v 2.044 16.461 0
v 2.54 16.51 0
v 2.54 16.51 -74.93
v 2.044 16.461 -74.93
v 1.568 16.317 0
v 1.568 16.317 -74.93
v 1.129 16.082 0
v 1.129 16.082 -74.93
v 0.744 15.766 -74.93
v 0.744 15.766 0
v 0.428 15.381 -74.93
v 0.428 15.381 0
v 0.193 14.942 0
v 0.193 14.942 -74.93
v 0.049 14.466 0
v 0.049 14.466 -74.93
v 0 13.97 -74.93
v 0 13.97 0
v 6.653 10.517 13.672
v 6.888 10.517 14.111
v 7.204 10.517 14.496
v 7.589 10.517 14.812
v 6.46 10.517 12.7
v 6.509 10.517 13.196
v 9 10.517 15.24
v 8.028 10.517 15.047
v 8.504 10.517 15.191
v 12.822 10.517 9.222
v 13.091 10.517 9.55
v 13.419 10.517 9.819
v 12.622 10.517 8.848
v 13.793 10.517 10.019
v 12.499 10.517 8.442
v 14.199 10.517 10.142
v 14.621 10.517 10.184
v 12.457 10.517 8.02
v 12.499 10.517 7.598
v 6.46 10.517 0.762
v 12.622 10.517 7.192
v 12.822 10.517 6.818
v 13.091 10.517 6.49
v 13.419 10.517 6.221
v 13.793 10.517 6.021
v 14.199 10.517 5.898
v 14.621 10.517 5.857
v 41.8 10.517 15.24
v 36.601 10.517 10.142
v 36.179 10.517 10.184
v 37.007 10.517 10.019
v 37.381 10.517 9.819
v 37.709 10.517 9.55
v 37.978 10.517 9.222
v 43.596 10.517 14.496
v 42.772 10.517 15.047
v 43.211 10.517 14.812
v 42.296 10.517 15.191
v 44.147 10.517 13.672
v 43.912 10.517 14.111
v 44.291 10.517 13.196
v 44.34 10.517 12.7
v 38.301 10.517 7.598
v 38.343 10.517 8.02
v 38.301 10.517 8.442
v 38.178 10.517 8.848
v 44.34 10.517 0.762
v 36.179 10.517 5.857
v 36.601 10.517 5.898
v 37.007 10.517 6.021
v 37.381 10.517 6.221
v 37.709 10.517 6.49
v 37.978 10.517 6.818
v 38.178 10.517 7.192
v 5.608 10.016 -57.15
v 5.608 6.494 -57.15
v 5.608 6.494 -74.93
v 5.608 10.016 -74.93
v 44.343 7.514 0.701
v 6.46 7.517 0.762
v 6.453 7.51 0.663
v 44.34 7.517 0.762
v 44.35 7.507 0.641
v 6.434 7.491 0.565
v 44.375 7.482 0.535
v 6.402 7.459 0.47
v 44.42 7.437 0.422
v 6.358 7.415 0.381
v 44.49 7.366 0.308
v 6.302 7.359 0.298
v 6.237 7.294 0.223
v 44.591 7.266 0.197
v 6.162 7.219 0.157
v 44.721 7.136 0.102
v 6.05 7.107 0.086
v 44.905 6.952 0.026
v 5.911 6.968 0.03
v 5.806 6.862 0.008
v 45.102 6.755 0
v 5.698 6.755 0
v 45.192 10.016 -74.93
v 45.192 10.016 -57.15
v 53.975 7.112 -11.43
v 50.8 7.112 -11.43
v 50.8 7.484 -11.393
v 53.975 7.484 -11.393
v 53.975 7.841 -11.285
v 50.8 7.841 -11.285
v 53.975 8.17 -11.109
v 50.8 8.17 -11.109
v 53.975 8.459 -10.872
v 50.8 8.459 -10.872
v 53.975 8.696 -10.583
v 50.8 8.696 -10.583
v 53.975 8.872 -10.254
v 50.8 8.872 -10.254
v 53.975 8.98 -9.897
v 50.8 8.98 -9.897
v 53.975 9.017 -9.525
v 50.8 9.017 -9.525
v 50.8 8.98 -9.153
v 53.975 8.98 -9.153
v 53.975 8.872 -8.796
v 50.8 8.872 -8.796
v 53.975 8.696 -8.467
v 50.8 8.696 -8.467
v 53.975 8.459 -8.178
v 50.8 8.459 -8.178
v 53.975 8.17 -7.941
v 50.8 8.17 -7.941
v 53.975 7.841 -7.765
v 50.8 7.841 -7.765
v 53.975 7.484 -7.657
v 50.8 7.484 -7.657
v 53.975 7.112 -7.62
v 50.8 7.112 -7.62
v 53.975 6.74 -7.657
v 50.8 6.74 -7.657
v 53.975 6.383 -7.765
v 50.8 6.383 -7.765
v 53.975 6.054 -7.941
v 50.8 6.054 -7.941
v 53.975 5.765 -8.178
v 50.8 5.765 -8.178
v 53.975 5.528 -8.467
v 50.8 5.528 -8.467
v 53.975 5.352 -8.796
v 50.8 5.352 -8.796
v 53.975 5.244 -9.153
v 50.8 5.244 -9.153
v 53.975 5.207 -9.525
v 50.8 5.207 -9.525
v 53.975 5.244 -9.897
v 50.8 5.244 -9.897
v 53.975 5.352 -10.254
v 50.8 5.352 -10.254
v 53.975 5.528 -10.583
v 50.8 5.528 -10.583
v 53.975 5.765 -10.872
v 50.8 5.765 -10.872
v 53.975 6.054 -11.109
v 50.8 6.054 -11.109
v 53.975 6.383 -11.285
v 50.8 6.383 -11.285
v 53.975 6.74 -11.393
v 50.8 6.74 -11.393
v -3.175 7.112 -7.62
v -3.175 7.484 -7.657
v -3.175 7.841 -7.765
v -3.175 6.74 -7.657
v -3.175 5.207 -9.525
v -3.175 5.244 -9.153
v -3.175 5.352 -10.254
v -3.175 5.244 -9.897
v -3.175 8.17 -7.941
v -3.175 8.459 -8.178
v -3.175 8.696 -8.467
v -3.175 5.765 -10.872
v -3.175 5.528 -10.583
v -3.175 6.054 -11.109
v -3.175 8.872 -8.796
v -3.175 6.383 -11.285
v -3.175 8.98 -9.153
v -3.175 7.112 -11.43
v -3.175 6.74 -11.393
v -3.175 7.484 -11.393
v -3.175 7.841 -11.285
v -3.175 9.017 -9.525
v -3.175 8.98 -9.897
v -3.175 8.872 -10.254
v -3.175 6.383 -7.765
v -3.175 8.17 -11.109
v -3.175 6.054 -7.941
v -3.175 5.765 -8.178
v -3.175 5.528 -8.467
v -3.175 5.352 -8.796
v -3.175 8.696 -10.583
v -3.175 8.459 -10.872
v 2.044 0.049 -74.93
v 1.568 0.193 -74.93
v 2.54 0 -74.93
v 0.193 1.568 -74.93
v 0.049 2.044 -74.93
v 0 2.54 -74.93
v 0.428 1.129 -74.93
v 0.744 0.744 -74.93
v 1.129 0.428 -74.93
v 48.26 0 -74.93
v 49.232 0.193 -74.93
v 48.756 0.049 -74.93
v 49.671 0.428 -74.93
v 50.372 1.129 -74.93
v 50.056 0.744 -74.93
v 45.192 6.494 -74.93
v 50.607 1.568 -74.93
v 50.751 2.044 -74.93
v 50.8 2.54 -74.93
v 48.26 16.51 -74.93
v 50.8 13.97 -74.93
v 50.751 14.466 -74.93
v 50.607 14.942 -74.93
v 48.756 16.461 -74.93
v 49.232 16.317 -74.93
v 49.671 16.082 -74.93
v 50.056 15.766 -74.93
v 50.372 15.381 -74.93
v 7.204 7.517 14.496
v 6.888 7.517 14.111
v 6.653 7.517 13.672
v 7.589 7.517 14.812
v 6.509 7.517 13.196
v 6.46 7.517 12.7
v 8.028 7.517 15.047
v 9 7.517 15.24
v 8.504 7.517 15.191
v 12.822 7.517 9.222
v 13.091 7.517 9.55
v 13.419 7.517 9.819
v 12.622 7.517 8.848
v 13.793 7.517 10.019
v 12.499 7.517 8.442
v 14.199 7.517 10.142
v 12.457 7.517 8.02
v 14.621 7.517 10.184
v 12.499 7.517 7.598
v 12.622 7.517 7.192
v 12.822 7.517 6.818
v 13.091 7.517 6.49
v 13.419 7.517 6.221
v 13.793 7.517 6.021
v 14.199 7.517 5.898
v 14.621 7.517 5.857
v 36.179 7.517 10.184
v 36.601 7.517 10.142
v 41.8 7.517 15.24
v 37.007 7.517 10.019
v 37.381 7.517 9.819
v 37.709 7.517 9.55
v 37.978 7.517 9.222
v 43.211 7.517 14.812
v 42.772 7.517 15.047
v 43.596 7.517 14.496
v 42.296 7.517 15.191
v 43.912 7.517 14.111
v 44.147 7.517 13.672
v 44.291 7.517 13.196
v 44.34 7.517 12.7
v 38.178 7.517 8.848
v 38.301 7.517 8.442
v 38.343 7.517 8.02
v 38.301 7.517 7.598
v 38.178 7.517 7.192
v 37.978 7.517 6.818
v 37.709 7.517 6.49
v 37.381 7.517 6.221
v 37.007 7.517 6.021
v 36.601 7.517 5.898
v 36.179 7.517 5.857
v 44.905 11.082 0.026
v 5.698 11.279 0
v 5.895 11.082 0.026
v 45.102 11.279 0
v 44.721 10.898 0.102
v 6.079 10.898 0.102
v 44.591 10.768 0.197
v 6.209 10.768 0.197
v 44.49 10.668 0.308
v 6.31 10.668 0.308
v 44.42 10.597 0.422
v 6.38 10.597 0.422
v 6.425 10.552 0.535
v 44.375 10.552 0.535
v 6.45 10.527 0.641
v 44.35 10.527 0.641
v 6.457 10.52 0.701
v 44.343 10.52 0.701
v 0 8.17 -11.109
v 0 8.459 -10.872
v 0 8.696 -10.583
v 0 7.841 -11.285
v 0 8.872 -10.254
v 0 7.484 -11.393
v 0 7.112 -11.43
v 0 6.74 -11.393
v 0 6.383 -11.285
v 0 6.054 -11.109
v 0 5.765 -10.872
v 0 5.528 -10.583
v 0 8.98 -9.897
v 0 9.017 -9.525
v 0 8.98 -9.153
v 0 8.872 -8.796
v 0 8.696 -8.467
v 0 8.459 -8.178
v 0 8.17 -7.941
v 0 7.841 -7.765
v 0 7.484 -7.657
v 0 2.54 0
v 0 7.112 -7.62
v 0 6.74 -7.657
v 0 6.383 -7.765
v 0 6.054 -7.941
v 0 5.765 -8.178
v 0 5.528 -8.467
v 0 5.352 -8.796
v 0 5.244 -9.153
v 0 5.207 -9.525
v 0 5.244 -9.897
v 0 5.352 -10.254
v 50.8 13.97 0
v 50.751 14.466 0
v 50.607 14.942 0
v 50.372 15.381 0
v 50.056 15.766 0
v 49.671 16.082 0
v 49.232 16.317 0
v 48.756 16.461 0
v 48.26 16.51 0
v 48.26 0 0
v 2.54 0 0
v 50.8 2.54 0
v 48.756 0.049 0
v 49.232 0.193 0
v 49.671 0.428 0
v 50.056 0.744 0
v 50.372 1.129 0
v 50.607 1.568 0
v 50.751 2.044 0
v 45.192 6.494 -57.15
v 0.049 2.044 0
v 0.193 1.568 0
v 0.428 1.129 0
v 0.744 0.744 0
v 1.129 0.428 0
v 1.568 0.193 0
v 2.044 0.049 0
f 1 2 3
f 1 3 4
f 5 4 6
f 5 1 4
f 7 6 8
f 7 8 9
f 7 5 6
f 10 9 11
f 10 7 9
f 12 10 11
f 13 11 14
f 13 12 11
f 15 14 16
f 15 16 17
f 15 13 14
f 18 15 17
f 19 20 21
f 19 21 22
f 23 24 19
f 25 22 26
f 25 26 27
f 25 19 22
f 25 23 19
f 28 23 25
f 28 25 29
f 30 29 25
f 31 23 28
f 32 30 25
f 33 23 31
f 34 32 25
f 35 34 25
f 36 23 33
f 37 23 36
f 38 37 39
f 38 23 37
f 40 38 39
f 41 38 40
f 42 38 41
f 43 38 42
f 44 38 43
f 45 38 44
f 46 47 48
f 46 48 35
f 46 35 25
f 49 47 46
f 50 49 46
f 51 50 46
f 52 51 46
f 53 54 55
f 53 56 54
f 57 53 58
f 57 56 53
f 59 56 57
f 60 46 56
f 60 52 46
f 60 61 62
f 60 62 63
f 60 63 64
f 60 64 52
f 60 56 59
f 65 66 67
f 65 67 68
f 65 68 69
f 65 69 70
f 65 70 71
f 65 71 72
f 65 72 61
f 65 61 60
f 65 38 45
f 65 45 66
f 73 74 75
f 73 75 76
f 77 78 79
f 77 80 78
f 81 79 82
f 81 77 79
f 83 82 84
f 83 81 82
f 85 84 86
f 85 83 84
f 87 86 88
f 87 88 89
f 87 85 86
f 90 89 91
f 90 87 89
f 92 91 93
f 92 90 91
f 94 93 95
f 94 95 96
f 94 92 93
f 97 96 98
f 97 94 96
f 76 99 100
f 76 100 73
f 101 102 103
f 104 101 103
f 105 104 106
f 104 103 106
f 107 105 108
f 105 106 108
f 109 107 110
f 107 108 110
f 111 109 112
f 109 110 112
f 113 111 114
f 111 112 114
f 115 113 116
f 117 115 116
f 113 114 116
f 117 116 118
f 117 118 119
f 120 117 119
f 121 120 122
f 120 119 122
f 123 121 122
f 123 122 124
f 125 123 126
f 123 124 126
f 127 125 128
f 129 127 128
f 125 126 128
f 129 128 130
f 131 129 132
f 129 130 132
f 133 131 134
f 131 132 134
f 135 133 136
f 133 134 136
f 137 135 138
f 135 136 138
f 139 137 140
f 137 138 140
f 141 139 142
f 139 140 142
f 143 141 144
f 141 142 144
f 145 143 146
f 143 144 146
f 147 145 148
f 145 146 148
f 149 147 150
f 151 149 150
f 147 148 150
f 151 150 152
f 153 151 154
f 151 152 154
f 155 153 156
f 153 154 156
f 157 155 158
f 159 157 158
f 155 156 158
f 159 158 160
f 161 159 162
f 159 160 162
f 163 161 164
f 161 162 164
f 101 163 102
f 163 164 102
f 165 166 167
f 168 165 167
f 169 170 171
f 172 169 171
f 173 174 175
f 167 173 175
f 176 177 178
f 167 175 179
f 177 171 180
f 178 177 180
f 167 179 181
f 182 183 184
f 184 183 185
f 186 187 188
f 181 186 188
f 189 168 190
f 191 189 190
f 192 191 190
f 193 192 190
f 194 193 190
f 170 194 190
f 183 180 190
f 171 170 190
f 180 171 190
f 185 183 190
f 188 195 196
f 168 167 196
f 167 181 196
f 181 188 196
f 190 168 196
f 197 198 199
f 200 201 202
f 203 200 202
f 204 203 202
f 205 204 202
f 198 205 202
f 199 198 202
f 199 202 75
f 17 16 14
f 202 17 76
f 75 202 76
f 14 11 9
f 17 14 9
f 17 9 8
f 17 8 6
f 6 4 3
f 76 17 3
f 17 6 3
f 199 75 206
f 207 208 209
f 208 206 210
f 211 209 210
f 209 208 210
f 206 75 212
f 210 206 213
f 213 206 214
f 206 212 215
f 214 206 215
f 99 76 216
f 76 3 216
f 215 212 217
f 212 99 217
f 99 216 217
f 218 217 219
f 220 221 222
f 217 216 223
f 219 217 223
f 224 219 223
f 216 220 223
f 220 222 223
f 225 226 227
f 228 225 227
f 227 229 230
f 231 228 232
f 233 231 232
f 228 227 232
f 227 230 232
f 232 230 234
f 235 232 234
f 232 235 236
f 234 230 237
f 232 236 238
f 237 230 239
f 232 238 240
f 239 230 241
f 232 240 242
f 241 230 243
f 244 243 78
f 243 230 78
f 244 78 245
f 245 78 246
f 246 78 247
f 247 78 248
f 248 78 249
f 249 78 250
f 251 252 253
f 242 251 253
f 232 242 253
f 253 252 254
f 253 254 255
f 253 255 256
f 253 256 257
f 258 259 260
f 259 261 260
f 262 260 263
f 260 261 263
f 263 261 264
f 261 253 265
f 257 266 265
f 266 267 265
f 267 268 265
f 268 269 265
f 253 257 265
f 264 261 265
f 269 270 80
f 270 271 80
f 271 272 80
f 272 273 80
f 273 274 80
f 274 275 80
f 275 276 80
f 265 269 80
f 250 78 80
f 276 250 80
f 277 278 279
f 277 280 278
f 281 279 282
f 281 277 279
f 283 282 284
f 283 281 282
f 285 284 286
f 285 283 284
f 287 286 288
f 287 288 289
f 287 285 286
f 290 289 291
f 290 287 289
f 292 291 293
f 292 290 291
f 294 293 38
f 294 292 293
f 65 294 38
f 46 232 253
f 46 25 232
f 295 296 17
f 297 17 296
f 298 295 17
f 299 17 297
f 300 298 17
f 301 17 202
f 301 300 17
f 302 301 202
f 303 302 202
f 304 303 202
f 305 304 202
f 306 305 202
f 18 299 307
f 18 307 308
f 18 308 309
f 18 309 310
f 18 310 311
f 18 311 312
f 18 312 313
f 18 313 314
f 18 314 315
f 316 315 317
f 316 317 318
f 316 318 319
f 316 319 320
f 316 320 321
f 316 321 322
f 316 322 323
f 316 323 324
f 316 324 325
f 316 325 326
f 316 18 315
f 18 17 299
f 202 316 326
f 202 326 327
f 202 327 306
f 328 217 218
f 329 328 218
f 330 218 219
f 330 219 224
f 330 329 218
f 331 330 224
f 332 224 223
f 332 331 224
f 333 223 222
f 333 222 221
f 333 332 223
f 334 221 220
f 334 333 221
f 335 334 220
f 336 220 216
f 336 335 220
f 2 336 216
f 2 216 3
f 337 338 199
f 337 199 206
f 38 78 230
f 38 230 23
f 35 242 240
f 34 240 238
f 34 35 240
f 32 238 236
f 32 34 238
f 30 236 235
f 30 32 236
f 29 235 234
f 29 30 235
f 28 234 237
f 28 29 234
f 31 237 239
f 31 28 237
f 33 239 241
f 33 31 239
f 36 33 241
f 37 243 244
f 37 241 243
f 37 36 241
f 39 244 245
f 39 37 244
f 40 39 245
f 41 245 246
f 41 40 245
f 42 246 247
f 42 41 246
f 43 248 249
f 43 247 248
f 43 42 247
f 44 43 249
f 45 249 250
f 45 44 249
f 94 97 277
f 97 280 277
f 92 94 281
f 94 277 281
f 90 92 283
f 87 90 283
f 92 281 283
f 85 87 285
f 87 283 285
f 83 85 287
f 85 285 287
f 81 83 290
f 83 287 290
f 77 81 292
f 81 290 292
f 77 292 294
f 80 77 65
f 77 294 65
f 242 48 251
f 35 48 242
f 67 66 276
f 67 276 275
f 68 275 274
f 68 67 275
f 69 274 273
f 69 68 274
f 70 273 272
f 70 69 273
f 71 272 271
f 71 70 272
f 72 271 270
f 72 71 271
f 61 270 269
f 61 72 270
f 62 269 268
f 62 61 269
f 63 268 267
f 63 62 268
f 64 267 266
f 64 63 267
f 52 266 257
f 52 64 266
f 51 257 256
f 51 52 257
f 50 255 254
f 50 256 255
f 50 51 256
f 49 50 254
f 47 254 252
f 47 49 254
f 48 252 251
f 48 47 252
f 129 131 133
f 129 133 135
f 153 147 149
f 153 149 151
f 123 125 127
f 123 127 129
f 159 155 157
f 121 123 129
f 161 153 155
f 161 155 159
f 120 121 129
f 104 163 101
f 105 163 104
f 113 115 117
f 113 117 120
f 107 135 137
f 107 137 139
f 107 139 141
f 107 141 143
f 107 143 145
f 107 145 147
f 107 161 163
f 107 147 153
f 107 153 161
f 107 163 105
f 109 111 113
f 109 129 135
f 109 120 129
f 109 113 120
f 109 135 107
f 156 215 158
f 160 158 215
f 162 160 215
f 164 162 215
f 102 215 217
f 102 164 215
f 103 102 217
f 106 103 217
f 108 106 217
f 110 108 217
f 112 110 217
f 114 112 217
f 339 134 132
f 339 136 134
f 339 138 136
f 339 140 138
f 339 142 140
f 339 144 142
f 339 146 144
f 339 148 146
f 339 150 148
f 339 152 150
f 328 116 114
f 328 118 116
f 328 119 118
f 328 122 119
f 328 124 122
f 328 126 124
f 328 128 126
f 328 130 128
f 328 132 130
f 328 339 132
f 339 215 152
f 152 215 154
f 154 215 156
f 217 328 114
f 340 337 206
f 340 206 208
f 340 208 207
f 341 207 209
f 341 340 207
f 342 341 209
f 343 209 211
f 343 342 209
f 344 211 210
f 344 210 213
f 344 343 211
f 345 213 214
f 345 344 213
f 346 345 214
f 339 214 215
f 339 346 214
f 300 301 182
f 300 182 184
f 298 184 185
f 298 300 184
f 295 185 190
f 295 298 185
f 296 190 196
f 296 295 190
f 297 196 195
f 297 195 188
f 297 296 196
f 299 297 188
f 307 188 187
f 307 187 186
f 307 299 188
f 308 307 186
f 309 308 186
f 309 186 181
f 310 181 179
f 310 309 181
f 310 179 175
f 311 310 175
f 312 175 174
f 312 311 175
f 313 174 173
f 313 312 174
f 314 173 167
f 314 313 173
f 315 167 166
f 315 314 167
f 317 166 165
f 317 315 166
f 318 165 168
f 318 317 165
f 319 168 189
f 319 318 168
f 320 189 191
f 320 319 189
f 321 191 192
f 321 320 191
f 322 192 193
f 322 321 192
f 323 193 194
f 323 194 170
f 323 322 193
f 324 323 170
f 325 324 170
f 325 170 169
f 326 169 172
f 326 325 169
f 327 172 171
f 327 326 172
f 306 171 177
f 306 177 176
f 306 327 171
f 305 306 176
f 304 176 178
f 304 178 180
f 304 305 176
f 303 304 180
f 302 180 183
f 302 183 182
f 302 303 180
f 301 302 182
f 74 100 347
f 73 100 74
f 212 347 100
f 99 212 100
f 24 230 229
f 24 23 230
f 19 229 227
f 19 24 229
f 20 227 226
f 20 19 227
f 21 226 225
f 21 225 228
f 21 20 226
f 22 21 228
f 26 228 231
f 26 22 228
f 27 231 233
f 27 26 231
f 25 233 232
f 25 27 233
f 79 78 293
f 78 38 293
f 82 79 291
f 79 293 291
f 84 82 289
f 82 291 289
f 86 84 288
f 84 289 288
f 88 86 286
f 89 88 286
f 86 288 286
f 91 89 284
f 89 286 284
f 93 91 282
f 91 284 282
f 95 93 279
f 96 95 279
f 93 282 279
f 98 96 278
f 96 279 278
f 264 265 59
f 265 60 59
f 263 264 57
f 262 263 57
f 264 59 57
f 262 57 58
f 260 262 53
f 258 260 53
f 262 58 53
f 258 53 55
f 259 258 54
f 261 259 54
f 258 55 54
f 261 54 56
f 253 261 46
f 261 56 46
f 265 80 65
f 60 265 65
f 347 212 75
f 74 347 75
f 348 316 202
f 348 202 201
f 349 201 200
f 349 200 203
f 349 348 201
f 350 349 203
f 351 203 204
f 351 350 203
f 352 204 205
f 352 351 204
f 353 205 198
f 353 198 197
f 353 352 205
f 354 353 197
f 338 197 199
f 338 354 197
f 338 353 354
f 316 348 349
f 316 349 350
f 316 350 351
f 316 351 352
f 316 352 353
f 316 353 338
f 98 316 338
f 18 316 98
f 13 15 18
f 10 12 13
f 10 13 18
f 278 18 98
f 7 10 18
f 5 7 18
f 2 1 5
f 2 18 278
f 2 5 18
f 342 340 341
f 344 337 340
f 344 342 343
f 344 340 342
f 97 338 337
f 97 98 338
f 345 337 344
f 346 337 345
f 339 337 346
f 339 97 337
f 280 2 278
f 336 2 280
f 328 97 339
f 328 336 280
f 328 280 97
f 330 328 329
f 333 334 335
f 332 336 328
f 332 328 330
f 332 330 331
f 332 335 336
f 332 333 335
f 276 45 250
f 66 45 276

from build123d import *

# Parameters (mm, degrees)
EXTRUDE1_DEPTH = 74.93
SKETCH2_R      = 1.905
EXTRUDE2_DEPTH = 3.175
SKETCH3_W      = 37.880364804
SKETCH3_H      = 3.00059593
EXTRUDE3_DEPTH = 15.24
FILLET1_R      = 2.54
FILLET2_R      = 0.762
EXTRUDE4_DEPTH = 17.78
SKETCH5_W      = 39.584129336
SKETCH5_H      = 3.52111337
EXTRUDE5_DEPTH = 17.78


with BuildPart() as part:
    # Sketch1 → Extrude1 (new body)
    with BuildSketch(Plane.XY):
        with BuildLine():
            Line((2.54, 0), (48.26, 0))
            ThreePointArc((48.26, 0), (50.056051224, 0.743948776), (50.8, 2.54))
            Line((50.8, 2.54), (50.8, 13.97))
            ThreePointArc((50.8, 13.97), (50.056051224, 15.766051224), (48.26, 16.51))
            Line((48.26, 16.51), (2.54, 16.51))
            ThreePointArc((2.54, 16.51), (0.743948776, 15.766051224), (0, 13.97))
            Line((0, 13.97), (0, 2.54))
            ThreePointArc((0, 2.54), (0.743948776, 0.743948776), (2.54, 0))
        make_face()
    extrude(amount=-EXTRUDE1_DEPTH)

    # Sketch2 → Extrude2 (add)
    with BuildSketch(Plane(origin=(0, 0, 0), x_dir=(0, 0, -1), z_dir=(1, 0, 0))):
        with Locations((9.525, 7.112)):
            Circle(SKETCH2_R)
    extrude2 = extrude(amount=-EXTRUDE2_DEPTH)

    # Mirror1: Extrude2 across plane
    add(extrude2.mirror(Plane(origin=(25.4, 0, 0), x_dir=(0, 0, 1), z_dir=(1, 0, 0))))

    # Sketch3 → Extrude3 (add)
    with BuildSketch(Plane.XY):
        with Locations((25.4, 9.017)):
            Rectangle(SKETCH3_W, SKETCH3_H)
    extrude(amount=EXTRUDE3_DEPTH)

    # Fillet1
    fillet1_edges = [part.edges().sort_by_distance(p)[0] for p in [
        (44.340182402, 9.017, 15.24),
        (6.459817598, 9.017, 15.24),
    ]]
    fillet(fillet1_edges, radius=FILLET1_R)

    # Fillet2
    fillet2_edges = [part.edges().sort_by_distance(p)[0] for p in [
        (44.340182402, 9.017, 0),
        (25.4, 10.517297965, 0),
        (6.459817598, 9.017, 0),
        (25.4, 7.516702035, 0),
    ]]
    fillet(fillet2_edges, radius=FILLET2_R)

    # Sketch4 → Extrude4 (cut)
    with BuildSketch(Plane(origin=(0, 10.517297965, 0), x_dir=(-1, 0, 0), z_dir=(0, 1, 0))):
        with BuildLine():
            Line((-36.179236435, 10.183663009), (-14.620763565, 10.183663009))
            ThreePointArc((-14.620763565, 10.183663009), (-12.457260283, 8.020159727), (-14.620763565, 5.856656445))
            Line((-14.620763565, 5.856656445), (-36.179236435, 5.856656445))
            ThreePointArc((-36.179236435, 5.856656445), (-38.342739717, 8.020159727), (-36.179236435, 10.183663009))
        make_face()
    extrude(amount=-EXTRUDE4_DEPTH, mode=Mode.SUBTRACT)

    # Sketch5 → Extrude5 (cut)
    with BuildSketch(Plane(origin=(0, 0, -74.93), x_dir=(-1, 0, 0), z_dir=(0, 0, -1))):
        with Locations((-25.4, 8.255)):
            Rectangle(SKETCH5_W, SKETCH5_H)
    extrude(amount=-EXTRUDE5_DEPTH, mode=Mode.SUBTRACT)


solid = part.part
